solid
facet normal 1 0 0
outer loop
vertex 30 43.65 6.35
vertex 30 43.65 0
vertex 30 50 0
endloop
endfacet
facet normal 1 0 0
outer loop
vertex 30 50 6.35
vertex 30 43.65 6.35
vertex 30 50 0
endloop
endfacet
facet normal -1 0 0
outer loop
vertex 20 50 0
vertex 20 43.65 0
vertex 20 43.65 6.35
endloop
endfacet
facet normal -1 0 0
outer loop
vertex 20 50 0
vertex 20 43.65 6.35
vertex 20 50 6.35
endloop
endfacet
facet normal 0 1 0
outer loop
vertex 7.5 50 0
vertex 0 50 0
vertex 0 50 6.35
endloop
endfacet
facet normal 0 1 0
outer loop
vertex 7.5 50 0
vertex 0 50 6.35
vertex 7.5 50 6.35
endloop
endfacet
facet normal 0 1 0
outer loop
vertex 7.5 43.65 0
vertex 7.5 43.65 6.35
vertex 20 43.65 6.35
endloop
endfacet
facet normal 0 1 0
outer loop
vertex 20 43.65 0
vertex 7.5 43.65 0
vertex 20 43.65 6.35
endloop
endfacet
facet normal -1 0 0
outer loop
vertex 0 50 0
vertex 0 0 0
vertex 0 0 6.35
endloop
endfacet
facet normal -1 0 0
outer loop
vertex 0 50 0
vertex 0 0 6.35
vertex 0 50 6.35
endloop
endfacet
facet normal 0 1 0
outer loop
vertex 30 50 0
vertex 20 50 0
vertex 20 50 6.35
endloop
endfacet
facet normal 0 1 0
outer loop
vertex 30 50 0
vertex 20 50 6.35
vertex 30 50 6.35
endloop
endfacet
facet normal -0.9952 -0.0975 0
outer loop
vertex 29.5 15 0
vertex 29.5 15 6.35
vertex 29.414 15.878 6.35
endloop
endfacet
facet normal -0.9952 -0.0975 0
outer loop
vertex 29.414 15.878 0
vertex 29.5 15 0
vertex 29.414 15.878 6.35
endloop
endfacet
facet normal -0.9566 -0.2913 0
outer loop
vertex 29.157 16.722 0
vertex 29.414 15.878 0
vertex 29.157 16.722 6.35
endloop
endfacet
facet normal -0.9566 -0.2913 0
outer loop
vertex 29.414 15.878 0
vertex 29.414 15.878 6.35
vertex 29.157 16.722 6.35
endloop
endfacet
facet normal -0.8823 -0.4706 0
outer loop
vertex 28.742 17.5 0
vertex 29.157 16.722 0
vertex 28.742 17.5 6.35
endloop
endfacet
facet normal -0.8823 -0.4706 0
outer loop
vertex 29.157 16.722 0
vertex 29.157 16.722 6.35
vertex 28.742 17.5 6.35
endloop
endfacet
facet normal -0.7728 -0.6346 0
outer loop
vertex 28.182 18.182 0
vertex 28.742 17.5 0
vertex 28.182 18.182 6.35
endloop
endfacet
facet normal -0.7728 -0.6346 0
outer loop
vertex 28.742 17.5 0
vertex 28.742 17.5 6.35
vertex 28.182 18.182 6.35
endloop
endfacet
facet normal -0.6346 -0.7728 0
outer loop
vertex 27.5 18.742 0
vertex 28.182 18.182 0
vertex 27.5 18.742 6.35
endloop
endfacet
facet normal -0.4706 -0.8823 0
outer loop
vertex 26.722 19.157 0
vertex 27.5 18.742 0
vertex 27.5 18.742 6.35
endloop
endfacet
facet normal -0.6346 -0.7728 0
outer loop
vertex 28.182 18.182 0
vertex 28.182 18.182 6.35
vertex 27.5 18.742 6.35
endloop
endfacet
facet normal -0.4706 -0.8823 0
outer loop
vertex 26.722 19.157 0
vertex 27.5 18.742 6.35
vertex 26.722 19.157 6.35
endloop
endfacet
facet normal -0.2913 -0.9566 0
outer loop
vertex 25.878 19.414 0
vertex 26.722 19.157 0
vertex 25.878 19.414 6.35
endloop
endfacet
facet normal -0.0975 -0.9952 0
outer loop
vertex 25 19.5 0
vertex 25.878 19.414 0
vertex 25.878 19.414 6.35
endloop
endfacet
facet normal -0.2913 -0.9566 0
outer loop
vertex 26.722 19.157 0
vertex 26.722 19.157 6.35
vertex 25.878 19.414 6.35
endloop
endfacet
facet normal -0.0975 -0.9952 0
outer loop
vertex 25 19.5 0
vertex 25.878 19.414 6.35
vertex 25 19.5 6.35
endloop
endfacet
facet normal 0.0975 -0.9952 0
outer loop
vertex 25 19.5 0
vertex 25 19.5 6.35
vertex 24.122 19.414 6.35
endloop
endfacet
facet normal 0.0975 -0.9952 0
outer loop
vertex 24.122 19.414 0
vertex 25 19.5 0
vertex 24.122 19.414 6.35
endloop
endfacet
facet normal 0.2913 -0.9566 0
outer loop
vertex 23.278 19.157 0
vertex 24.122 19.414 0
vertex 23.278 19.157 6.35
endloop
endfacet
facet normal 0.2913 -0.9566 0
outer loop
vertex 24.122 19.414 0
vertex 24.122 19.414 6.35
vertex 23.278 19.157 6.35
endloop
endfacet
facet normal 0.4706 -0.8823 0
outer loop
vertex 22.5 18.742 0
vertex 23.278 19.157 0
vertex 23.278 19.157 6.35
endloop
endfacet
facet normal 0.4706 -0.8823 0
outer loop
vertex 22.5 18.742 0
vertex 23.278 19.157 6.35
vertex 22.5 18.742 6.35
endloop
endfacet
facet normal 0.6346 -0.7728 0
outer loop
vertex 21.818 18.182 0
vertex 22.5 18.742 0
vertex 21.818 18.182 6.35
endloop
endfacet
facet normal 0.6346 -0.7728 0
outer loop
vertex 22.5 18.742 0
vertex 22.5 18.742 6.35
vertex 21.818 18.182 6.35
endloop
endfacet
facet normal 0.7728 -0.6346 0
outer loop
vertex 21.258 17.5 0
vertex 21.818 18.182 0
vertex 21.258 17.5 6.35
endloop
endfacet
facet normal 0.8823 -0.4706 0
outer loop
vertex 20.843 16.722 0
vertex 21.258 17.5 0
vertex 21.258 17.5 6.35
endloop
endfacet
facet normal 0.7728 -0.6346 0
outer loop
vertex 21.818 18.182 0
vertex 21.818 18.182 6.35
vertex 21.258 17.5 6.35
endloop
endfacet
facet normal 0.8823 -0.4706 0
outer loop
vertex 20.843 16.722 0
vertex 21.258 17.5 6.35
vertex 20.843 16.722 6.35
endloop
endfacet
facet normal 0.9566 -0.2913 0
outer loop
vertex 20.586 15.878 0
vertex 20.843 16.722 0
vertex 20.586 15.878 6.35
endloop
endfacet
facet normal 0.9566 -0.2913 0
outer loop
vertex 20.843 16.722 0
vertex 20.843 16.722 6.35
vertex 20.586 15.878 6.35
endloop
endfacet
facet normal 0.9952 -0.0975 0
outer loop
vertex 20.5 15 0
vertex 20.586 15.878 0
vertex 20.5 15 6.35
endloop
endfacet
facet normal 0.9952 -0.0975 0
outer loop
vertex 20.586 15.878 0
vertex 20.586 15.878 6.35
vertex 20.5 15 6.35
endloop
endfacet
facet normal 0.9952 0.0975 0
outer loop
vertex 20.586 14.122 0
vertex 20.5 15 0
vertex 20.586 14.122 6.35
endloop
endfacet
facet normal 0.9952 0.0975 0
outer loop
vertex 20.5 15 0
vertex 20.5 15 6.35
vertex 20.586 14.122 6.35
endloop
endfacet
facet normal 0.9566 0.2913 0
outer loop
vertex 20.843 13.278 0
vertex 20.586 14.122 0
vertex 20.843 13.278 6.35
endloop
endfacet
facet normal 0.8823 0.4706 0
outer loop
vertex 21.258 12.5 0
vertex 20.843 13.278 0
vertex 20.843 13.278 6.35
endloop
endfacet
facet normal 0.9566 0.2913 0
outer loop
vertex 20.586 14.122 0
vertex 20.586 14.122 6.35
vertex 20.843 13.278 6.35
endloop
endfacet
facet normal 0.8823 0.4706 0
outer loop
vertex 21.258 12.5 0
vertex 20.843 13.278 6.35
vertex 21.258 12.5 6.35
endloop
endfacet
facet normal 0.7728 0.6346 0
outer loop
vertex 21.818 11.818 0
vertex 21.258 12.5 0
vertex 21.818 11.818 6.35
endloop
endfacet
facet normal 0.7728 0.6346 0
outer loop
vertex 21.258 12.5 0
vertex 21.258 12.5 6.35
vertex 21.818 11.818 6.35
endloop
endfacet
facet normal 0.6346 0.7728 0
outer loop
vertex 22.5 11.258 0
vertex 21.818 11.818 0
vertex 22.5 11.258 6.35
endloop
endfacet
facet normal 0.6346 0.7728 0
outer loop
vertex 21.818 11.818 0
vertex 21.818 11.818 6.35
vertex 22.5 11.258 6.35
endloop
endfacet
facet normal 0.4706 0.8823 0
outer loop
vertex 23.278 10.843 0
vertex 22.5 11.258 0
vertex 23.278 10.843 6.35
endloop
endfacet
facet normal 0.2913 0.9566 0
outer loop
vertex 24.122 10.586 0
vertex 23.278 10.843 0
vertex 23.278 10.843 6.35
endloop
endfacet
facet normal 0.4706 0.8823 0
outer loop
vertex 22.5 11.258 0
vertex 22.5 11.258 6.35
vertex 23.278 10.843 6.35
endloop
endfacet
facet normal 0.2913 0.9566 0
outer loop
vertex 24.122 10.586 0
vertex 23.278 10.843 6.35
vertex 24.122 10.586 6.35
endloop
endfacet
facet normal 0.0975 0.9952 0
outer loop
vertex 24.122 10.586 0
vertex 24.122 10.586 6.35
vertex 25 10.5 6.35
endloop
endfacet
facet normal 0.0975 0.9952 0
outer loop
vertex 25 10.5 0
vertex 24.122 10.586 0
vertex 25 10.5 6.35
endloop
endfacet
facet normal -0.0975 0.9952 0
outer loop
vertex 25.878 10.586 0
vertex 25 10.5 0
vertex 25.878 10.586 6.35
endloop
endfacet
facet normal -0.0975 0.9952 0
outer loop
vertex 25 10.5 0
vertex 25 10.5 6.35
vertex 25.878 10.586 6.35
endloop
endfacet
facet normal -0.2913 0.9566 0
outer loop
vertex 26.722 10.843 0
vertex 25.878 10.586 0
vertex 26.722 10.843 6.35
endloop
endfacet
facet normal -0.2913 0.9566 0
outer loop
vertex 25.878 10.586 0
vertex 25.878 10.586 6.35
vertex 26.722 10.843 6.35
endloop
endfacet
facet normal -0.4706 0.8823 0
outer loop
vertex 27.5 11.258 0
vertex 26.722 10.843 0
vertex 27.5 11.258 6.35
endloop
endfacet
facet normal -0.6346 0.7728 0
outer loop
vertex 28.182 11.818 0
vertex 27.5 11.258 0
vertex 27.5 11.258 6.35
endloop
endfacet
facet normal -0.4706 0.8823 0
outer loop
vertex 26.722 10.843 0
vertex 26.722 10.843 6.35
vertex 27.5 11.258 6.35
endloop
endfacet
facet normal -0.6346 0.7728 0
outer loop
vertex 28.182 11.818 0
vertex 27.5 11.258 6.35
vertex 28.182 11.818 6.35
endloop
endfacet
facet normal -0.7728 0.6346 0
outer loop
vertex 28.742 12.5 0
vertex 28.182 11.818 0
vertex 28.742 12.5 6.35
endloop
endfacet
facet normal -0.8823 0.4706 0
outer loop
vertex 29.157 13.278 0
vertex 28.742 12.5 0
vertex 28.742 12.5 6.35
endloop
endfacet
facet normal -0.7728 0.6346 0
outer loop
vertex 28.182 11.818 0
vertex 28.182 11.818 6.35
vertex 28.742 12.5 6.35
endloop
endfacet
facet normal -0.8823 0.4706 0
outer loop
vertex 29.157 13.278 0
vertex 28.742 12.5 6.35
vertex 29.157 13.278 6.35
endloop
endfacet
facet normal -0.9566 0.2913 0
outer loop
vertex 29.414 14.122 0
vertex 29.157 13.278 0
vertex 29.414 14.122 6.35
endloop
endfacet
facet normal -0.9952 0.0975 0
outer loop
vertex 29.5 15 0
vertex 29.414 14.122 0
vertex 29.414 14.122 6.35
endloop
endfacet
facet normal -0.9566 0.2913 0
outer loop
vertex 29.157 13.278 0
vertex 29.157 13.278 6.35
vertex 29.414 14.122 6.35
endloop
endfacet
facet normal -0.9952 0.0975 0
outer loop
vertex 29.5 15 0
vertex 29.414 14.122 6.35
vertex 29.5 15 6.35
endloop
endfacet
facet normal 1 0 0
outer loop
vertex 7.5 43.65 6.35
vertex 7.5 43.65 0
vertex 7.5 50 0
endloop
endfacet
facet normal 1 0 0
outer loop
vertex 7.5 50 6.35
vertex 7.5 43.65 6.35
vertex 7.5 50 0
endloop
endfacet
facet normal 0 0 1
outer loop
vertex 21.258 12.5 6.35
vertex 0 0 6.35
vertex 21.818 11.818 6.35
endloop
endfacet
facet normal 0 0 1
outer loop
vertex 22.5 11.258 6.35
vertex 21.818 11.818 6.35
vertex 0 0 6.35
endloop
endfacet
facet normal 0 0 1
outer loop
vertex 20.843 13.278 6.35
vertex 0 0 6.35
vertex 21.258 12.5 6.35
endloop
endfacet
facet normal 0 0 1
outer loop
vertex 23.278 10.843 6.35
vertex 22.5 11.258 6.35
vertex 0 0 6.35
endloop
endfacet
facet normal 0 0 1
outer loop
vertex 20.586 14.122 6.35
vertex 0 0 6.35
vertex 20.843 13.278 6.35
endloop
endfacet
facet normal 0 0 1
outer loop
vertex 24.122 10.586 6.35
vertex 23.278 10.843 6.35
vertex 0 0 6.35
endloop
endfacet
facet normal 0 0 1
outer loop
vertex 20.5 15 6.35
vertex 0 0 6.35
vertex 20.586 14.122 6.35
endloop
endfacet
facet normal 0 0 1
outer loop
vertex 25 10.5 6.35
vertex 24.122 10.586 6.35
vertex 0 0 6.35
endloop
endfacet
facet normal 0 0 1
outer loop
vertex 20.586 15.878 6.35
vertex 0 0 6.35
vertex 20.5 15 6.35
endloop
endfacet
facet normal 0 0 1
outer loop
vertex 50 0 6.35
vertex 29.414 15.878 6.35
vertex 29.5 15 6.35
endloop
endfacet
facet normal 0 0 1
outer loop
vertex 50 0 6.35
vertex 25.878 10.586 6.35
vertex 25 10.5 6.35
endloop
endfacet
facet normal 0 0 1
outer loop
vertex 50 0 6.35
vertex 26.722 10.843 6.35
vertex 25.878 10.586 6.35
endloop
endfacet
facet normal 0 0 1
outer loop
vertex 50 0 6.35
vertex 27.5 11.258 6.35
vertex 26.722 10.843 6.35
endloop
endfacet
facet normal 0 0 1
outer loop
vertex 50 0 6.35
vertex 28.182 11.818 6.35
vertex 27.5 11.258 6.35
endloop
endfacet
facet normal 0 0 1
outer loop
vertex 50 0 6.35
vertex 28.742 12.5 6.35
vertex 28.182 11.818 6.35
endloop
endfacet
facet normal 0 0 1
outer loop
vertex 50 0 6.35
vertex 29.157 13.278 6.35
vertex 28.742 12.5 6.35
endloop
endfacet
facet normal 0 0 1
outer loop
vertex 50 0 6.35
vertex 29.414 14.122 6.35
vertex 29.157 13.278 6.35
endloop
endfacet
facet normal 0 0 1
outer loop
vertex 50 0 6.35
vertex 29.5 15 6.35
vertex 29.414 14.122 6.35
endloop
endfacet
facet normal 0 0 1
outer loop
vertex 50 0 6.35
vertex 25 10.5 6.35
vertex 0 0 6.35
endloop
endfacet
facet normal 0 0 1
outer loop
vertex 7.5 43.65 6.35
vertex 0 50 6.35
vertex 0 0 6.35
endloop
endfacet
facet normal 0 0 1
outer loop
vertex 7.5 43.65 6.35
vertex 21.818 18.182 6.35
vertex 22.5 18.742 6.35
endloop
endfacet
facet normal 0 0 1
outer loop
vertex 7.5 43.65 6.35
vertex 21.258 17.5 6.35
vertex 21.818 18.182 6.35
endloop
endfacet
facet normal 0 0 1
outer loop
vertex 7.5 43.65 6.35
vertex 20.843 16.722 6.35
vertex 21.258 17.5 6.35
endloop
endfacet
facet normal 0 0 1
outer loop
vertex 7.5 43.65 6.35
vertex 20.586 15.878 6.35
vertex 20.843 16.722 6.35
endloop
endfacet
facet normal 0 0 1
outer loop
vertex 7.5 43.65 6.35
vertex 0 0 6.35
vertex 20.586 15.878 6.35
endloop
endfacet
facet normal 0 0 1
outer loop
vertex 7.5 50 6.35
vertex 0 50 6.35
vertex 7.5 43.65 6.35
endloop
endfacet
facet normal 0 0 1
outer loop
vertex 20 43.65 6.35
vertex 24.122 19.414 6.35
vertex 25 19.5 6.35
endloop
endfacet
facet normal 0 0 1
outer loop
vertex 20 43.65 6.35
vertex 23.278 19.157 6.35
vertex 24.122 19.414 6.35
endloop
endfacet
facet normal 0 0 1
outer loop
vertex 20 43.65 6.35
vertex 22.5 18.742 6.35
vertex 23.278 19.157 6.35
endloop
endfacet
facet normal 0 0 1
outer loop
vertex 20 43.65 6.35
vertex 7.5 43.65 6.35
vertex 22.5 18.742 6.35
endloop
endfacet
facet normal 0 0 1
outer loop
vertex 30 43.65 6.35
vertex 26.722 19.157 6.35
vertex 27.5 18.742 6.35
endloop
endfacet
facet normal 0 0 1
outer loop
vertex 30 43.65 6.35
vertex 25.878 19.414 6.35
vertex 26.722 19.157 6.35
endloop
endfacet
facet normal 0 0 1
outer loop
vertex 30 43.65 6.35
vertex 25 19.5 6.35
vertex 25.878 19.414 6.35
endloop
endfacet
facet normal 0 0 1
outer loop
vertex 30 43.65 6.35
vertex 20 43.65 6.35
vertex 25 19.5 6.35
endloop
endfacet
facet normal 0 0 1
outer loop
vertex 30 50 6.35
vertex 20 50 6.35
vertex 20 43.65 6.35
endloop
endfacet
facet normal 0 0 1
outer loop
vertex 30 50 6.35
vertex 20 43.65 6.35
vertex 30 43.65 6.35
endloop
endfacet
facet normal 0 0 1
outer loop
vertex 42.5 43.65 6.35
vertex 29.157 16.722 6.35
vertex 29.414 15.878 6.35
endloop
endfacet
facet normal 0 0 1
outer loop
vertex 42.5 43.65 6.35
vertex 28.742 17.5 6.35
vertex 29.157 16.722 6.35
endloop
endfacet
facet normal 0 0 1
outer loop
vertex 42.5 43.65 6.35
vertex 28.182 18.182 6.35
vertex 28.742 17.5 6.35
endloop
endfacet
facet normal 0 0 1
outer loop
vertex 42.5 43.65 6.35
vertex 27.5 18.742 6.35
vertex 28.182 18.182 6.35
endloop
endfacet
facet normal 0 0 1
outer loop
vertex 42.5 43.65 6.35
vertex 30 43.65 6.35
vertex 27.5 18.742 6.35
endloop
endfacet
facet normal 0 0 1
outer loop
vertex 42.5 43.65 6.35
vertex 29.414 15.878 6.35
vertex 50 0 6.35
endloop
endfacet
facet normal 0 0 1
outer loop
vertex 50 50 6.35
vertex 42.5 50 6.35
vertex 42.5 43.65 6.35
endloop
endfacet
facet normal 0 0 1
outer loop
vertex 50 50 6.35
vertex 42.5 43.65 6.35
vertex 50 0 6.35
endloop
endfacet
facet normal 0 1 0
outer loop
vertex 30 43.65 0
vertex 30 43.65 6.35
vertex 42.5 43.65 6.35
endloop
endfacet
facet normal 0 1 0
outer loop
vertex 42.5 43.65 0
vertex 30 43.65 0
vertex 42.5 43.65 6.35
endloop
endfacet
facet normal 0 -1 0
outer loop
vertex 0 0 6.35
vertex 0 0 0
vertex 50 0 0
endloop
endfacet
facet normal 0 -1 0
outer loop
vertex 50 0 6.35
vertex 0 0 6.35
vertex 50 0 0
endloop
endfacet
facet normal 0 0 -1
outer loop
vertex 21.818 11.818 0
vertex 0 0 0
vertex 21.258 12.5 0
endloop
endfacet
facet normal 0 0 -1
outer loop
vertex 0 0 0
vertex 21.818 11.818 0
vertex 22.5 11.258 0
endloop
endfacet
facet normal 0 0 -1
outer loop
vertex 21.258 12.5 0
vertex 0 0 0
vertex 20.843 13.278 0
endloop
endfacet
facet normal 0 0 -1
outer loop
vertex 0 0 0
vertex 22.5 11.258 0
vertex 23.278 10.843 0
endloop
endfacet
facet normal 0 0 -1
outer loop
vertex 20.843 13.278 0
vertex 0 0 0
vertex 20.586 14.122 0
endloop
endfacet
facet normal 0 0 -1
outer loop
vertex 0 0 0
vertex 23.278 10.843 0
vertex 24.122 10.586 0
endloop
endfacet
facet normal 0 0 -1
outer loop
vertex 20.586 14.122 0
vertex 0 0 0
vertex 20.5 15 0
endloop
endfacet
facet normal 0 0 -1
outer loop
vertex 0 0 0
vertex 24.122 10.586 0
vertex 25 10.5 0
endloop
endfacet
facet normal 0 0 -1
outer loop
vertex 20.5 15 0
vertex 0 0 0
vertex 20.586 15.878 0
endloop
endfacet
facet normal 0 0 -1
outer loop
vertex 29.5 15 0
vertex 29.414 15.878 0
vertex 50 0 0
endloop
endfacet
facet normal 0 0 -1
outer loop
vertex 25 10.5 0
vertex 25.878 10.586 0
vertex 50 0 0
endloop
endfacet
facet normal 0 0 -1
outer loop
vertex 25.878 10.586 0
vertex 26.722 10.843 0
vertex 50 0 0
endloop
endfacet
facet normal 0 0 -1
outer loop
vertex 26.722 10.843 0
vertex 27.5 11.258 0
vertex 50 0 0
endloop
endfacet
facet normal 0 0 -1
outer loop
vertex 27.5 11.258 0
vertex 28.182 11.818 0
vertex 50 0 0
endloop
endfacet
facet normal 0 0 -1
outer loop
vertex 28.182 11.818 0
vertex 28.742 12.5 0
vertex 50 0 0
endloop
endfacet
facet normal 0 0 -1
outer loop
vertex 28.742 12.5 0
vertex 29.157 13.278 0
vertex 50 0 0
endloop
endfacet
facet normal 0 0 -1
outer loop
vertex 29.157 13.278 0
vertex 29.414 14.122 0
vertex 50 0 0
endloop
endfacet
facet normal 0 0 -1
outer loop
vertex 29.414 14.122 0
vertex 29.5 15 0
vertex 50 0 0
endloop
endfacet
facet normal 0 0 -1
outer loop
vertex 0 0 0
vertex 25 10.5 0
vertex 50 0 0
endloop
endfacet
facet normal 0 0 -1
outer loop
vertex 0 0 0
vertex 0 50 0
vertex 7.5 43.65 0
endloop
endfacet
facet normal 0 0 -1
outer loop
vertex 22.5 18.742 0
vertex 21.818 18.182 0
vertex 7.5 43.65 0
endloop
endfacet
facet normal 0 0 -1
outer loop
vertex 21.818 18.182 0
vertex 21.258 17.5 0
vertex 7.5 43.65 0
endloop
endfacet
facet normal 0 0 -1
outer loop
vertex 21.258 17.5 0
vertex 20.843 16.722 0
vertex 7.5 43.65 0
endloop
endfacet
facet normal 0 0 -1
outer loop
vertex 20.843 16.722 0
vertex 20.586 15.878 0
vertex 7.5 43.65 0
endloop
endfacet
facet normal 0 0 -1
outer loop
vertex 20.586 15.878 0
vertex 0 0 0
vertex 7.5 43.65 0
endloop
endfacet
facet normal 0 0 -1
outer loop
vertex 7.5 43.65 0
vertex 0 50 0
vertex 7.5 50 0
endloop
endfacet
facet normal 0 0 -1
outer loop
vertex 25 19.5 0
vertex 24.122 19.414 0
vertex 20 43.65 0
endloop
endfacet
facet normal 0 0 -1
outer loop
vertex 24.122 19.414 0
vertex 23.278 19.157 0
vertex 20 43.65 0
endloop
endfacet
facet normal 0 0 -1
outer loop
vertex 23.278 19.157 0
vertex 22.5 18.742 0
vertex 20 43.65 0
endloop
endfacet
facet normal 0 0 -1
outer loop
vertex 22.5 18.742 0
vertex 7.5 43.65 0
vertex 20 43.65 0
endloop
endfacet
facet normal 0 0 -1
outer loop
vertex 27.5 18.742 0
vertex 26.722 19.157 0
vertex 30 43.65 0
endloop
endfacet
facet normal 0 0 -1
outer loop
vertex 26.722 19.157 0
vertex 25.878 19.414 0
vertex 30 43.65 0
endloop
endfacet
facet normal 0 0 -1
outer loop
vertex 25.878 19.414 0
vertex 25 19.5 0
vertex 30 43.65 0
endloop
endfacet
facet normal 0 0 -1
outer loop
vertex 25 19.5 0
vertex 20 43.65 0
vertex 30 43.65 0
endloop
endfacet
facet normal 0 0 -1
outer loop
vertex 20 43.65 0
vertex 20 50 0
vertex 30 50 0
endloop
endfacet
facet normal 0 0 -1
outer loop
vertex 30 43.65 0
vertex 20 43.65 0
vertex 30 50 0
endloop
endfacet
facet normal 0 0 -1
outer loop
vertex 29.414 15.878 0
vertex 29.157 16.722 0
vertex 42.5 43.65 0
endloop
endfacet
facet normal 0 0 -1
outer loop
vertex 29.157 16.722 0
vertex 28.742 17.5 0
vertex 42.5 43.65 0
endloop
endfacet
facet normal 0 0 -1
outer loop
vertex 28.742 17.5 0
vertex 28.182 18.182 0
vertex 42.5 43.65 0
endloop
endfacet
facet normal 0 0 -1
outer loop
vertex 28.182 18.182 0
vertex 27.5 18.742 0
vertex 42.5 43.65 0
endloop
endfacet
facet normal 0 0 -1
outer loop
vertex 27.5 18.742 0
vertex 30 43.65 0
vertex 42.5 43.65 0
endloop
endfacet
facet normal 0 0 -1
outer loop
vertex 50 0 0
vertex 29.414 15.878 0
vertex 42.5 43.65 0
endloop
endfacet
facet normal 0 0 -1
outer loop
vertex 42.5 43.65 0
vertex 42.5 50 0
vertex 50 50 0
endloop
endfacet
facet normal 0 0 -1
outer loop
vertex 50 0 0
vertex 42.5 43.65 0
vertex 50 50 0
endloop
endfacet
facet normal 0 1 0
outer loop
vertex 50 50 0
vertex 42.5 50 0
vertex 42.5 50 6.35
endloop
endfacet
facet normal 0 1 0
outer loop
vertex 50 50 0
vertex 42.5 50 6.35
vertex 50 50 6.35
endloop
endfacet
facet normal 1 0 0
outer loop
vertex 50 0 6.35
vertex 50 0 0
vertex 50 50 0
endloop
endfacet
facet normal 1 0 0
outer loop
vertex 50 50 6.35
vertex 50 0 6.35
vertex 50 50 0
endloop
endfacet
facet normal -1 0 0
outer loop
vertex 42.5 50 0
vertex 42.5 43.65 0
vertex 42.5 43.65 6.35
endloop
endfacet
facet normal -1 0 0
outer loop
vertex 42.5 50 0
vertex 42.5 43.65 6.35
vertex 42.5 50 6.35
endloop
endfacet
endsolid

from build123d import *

# Parameters (mm, degrees)
SKETCH1_W           = 50
SKETCH1_H           = 50
BOSS_EXTRUDE1_DEPTH = 6.35
SKETCH4_R           = 4.5
SKETCH4_W           = 12.5
SKETCH4_H           = 6.35
CUT_EXTRUDE1_DEPTH  = 6.35


with BuildPart() as part:
    # Sketch1 → Boss-Extrude1 (new body)
    with BuildSketch(Plane.XY):
        with Locations((25, 25)):
            Rectangle(SKETCH1_W, SKETCH1_H)
    extrude(amount=BOSS_EXTRUDE1_DEPTH)

    # Sketch4 → Cut-Extrude1 (cut)
    with BuildSketch(Plane.XY.offset(6.35)):
        with Locations((25, 15)):
            Circle(SKETCH4_R)
        with Locations((13.75, 46.825)):
            Rectangle(SKETCH4_W, SKETCH4_H)
        with Locations((36.25, 46.825)):
            Rectangle(SKETCH4_W, SKETCH4_H)
    extrude(amount=-CUT_EXTRUDE1_DEPTH, mode=Mode.SUBTRACT)


solid = part.part
